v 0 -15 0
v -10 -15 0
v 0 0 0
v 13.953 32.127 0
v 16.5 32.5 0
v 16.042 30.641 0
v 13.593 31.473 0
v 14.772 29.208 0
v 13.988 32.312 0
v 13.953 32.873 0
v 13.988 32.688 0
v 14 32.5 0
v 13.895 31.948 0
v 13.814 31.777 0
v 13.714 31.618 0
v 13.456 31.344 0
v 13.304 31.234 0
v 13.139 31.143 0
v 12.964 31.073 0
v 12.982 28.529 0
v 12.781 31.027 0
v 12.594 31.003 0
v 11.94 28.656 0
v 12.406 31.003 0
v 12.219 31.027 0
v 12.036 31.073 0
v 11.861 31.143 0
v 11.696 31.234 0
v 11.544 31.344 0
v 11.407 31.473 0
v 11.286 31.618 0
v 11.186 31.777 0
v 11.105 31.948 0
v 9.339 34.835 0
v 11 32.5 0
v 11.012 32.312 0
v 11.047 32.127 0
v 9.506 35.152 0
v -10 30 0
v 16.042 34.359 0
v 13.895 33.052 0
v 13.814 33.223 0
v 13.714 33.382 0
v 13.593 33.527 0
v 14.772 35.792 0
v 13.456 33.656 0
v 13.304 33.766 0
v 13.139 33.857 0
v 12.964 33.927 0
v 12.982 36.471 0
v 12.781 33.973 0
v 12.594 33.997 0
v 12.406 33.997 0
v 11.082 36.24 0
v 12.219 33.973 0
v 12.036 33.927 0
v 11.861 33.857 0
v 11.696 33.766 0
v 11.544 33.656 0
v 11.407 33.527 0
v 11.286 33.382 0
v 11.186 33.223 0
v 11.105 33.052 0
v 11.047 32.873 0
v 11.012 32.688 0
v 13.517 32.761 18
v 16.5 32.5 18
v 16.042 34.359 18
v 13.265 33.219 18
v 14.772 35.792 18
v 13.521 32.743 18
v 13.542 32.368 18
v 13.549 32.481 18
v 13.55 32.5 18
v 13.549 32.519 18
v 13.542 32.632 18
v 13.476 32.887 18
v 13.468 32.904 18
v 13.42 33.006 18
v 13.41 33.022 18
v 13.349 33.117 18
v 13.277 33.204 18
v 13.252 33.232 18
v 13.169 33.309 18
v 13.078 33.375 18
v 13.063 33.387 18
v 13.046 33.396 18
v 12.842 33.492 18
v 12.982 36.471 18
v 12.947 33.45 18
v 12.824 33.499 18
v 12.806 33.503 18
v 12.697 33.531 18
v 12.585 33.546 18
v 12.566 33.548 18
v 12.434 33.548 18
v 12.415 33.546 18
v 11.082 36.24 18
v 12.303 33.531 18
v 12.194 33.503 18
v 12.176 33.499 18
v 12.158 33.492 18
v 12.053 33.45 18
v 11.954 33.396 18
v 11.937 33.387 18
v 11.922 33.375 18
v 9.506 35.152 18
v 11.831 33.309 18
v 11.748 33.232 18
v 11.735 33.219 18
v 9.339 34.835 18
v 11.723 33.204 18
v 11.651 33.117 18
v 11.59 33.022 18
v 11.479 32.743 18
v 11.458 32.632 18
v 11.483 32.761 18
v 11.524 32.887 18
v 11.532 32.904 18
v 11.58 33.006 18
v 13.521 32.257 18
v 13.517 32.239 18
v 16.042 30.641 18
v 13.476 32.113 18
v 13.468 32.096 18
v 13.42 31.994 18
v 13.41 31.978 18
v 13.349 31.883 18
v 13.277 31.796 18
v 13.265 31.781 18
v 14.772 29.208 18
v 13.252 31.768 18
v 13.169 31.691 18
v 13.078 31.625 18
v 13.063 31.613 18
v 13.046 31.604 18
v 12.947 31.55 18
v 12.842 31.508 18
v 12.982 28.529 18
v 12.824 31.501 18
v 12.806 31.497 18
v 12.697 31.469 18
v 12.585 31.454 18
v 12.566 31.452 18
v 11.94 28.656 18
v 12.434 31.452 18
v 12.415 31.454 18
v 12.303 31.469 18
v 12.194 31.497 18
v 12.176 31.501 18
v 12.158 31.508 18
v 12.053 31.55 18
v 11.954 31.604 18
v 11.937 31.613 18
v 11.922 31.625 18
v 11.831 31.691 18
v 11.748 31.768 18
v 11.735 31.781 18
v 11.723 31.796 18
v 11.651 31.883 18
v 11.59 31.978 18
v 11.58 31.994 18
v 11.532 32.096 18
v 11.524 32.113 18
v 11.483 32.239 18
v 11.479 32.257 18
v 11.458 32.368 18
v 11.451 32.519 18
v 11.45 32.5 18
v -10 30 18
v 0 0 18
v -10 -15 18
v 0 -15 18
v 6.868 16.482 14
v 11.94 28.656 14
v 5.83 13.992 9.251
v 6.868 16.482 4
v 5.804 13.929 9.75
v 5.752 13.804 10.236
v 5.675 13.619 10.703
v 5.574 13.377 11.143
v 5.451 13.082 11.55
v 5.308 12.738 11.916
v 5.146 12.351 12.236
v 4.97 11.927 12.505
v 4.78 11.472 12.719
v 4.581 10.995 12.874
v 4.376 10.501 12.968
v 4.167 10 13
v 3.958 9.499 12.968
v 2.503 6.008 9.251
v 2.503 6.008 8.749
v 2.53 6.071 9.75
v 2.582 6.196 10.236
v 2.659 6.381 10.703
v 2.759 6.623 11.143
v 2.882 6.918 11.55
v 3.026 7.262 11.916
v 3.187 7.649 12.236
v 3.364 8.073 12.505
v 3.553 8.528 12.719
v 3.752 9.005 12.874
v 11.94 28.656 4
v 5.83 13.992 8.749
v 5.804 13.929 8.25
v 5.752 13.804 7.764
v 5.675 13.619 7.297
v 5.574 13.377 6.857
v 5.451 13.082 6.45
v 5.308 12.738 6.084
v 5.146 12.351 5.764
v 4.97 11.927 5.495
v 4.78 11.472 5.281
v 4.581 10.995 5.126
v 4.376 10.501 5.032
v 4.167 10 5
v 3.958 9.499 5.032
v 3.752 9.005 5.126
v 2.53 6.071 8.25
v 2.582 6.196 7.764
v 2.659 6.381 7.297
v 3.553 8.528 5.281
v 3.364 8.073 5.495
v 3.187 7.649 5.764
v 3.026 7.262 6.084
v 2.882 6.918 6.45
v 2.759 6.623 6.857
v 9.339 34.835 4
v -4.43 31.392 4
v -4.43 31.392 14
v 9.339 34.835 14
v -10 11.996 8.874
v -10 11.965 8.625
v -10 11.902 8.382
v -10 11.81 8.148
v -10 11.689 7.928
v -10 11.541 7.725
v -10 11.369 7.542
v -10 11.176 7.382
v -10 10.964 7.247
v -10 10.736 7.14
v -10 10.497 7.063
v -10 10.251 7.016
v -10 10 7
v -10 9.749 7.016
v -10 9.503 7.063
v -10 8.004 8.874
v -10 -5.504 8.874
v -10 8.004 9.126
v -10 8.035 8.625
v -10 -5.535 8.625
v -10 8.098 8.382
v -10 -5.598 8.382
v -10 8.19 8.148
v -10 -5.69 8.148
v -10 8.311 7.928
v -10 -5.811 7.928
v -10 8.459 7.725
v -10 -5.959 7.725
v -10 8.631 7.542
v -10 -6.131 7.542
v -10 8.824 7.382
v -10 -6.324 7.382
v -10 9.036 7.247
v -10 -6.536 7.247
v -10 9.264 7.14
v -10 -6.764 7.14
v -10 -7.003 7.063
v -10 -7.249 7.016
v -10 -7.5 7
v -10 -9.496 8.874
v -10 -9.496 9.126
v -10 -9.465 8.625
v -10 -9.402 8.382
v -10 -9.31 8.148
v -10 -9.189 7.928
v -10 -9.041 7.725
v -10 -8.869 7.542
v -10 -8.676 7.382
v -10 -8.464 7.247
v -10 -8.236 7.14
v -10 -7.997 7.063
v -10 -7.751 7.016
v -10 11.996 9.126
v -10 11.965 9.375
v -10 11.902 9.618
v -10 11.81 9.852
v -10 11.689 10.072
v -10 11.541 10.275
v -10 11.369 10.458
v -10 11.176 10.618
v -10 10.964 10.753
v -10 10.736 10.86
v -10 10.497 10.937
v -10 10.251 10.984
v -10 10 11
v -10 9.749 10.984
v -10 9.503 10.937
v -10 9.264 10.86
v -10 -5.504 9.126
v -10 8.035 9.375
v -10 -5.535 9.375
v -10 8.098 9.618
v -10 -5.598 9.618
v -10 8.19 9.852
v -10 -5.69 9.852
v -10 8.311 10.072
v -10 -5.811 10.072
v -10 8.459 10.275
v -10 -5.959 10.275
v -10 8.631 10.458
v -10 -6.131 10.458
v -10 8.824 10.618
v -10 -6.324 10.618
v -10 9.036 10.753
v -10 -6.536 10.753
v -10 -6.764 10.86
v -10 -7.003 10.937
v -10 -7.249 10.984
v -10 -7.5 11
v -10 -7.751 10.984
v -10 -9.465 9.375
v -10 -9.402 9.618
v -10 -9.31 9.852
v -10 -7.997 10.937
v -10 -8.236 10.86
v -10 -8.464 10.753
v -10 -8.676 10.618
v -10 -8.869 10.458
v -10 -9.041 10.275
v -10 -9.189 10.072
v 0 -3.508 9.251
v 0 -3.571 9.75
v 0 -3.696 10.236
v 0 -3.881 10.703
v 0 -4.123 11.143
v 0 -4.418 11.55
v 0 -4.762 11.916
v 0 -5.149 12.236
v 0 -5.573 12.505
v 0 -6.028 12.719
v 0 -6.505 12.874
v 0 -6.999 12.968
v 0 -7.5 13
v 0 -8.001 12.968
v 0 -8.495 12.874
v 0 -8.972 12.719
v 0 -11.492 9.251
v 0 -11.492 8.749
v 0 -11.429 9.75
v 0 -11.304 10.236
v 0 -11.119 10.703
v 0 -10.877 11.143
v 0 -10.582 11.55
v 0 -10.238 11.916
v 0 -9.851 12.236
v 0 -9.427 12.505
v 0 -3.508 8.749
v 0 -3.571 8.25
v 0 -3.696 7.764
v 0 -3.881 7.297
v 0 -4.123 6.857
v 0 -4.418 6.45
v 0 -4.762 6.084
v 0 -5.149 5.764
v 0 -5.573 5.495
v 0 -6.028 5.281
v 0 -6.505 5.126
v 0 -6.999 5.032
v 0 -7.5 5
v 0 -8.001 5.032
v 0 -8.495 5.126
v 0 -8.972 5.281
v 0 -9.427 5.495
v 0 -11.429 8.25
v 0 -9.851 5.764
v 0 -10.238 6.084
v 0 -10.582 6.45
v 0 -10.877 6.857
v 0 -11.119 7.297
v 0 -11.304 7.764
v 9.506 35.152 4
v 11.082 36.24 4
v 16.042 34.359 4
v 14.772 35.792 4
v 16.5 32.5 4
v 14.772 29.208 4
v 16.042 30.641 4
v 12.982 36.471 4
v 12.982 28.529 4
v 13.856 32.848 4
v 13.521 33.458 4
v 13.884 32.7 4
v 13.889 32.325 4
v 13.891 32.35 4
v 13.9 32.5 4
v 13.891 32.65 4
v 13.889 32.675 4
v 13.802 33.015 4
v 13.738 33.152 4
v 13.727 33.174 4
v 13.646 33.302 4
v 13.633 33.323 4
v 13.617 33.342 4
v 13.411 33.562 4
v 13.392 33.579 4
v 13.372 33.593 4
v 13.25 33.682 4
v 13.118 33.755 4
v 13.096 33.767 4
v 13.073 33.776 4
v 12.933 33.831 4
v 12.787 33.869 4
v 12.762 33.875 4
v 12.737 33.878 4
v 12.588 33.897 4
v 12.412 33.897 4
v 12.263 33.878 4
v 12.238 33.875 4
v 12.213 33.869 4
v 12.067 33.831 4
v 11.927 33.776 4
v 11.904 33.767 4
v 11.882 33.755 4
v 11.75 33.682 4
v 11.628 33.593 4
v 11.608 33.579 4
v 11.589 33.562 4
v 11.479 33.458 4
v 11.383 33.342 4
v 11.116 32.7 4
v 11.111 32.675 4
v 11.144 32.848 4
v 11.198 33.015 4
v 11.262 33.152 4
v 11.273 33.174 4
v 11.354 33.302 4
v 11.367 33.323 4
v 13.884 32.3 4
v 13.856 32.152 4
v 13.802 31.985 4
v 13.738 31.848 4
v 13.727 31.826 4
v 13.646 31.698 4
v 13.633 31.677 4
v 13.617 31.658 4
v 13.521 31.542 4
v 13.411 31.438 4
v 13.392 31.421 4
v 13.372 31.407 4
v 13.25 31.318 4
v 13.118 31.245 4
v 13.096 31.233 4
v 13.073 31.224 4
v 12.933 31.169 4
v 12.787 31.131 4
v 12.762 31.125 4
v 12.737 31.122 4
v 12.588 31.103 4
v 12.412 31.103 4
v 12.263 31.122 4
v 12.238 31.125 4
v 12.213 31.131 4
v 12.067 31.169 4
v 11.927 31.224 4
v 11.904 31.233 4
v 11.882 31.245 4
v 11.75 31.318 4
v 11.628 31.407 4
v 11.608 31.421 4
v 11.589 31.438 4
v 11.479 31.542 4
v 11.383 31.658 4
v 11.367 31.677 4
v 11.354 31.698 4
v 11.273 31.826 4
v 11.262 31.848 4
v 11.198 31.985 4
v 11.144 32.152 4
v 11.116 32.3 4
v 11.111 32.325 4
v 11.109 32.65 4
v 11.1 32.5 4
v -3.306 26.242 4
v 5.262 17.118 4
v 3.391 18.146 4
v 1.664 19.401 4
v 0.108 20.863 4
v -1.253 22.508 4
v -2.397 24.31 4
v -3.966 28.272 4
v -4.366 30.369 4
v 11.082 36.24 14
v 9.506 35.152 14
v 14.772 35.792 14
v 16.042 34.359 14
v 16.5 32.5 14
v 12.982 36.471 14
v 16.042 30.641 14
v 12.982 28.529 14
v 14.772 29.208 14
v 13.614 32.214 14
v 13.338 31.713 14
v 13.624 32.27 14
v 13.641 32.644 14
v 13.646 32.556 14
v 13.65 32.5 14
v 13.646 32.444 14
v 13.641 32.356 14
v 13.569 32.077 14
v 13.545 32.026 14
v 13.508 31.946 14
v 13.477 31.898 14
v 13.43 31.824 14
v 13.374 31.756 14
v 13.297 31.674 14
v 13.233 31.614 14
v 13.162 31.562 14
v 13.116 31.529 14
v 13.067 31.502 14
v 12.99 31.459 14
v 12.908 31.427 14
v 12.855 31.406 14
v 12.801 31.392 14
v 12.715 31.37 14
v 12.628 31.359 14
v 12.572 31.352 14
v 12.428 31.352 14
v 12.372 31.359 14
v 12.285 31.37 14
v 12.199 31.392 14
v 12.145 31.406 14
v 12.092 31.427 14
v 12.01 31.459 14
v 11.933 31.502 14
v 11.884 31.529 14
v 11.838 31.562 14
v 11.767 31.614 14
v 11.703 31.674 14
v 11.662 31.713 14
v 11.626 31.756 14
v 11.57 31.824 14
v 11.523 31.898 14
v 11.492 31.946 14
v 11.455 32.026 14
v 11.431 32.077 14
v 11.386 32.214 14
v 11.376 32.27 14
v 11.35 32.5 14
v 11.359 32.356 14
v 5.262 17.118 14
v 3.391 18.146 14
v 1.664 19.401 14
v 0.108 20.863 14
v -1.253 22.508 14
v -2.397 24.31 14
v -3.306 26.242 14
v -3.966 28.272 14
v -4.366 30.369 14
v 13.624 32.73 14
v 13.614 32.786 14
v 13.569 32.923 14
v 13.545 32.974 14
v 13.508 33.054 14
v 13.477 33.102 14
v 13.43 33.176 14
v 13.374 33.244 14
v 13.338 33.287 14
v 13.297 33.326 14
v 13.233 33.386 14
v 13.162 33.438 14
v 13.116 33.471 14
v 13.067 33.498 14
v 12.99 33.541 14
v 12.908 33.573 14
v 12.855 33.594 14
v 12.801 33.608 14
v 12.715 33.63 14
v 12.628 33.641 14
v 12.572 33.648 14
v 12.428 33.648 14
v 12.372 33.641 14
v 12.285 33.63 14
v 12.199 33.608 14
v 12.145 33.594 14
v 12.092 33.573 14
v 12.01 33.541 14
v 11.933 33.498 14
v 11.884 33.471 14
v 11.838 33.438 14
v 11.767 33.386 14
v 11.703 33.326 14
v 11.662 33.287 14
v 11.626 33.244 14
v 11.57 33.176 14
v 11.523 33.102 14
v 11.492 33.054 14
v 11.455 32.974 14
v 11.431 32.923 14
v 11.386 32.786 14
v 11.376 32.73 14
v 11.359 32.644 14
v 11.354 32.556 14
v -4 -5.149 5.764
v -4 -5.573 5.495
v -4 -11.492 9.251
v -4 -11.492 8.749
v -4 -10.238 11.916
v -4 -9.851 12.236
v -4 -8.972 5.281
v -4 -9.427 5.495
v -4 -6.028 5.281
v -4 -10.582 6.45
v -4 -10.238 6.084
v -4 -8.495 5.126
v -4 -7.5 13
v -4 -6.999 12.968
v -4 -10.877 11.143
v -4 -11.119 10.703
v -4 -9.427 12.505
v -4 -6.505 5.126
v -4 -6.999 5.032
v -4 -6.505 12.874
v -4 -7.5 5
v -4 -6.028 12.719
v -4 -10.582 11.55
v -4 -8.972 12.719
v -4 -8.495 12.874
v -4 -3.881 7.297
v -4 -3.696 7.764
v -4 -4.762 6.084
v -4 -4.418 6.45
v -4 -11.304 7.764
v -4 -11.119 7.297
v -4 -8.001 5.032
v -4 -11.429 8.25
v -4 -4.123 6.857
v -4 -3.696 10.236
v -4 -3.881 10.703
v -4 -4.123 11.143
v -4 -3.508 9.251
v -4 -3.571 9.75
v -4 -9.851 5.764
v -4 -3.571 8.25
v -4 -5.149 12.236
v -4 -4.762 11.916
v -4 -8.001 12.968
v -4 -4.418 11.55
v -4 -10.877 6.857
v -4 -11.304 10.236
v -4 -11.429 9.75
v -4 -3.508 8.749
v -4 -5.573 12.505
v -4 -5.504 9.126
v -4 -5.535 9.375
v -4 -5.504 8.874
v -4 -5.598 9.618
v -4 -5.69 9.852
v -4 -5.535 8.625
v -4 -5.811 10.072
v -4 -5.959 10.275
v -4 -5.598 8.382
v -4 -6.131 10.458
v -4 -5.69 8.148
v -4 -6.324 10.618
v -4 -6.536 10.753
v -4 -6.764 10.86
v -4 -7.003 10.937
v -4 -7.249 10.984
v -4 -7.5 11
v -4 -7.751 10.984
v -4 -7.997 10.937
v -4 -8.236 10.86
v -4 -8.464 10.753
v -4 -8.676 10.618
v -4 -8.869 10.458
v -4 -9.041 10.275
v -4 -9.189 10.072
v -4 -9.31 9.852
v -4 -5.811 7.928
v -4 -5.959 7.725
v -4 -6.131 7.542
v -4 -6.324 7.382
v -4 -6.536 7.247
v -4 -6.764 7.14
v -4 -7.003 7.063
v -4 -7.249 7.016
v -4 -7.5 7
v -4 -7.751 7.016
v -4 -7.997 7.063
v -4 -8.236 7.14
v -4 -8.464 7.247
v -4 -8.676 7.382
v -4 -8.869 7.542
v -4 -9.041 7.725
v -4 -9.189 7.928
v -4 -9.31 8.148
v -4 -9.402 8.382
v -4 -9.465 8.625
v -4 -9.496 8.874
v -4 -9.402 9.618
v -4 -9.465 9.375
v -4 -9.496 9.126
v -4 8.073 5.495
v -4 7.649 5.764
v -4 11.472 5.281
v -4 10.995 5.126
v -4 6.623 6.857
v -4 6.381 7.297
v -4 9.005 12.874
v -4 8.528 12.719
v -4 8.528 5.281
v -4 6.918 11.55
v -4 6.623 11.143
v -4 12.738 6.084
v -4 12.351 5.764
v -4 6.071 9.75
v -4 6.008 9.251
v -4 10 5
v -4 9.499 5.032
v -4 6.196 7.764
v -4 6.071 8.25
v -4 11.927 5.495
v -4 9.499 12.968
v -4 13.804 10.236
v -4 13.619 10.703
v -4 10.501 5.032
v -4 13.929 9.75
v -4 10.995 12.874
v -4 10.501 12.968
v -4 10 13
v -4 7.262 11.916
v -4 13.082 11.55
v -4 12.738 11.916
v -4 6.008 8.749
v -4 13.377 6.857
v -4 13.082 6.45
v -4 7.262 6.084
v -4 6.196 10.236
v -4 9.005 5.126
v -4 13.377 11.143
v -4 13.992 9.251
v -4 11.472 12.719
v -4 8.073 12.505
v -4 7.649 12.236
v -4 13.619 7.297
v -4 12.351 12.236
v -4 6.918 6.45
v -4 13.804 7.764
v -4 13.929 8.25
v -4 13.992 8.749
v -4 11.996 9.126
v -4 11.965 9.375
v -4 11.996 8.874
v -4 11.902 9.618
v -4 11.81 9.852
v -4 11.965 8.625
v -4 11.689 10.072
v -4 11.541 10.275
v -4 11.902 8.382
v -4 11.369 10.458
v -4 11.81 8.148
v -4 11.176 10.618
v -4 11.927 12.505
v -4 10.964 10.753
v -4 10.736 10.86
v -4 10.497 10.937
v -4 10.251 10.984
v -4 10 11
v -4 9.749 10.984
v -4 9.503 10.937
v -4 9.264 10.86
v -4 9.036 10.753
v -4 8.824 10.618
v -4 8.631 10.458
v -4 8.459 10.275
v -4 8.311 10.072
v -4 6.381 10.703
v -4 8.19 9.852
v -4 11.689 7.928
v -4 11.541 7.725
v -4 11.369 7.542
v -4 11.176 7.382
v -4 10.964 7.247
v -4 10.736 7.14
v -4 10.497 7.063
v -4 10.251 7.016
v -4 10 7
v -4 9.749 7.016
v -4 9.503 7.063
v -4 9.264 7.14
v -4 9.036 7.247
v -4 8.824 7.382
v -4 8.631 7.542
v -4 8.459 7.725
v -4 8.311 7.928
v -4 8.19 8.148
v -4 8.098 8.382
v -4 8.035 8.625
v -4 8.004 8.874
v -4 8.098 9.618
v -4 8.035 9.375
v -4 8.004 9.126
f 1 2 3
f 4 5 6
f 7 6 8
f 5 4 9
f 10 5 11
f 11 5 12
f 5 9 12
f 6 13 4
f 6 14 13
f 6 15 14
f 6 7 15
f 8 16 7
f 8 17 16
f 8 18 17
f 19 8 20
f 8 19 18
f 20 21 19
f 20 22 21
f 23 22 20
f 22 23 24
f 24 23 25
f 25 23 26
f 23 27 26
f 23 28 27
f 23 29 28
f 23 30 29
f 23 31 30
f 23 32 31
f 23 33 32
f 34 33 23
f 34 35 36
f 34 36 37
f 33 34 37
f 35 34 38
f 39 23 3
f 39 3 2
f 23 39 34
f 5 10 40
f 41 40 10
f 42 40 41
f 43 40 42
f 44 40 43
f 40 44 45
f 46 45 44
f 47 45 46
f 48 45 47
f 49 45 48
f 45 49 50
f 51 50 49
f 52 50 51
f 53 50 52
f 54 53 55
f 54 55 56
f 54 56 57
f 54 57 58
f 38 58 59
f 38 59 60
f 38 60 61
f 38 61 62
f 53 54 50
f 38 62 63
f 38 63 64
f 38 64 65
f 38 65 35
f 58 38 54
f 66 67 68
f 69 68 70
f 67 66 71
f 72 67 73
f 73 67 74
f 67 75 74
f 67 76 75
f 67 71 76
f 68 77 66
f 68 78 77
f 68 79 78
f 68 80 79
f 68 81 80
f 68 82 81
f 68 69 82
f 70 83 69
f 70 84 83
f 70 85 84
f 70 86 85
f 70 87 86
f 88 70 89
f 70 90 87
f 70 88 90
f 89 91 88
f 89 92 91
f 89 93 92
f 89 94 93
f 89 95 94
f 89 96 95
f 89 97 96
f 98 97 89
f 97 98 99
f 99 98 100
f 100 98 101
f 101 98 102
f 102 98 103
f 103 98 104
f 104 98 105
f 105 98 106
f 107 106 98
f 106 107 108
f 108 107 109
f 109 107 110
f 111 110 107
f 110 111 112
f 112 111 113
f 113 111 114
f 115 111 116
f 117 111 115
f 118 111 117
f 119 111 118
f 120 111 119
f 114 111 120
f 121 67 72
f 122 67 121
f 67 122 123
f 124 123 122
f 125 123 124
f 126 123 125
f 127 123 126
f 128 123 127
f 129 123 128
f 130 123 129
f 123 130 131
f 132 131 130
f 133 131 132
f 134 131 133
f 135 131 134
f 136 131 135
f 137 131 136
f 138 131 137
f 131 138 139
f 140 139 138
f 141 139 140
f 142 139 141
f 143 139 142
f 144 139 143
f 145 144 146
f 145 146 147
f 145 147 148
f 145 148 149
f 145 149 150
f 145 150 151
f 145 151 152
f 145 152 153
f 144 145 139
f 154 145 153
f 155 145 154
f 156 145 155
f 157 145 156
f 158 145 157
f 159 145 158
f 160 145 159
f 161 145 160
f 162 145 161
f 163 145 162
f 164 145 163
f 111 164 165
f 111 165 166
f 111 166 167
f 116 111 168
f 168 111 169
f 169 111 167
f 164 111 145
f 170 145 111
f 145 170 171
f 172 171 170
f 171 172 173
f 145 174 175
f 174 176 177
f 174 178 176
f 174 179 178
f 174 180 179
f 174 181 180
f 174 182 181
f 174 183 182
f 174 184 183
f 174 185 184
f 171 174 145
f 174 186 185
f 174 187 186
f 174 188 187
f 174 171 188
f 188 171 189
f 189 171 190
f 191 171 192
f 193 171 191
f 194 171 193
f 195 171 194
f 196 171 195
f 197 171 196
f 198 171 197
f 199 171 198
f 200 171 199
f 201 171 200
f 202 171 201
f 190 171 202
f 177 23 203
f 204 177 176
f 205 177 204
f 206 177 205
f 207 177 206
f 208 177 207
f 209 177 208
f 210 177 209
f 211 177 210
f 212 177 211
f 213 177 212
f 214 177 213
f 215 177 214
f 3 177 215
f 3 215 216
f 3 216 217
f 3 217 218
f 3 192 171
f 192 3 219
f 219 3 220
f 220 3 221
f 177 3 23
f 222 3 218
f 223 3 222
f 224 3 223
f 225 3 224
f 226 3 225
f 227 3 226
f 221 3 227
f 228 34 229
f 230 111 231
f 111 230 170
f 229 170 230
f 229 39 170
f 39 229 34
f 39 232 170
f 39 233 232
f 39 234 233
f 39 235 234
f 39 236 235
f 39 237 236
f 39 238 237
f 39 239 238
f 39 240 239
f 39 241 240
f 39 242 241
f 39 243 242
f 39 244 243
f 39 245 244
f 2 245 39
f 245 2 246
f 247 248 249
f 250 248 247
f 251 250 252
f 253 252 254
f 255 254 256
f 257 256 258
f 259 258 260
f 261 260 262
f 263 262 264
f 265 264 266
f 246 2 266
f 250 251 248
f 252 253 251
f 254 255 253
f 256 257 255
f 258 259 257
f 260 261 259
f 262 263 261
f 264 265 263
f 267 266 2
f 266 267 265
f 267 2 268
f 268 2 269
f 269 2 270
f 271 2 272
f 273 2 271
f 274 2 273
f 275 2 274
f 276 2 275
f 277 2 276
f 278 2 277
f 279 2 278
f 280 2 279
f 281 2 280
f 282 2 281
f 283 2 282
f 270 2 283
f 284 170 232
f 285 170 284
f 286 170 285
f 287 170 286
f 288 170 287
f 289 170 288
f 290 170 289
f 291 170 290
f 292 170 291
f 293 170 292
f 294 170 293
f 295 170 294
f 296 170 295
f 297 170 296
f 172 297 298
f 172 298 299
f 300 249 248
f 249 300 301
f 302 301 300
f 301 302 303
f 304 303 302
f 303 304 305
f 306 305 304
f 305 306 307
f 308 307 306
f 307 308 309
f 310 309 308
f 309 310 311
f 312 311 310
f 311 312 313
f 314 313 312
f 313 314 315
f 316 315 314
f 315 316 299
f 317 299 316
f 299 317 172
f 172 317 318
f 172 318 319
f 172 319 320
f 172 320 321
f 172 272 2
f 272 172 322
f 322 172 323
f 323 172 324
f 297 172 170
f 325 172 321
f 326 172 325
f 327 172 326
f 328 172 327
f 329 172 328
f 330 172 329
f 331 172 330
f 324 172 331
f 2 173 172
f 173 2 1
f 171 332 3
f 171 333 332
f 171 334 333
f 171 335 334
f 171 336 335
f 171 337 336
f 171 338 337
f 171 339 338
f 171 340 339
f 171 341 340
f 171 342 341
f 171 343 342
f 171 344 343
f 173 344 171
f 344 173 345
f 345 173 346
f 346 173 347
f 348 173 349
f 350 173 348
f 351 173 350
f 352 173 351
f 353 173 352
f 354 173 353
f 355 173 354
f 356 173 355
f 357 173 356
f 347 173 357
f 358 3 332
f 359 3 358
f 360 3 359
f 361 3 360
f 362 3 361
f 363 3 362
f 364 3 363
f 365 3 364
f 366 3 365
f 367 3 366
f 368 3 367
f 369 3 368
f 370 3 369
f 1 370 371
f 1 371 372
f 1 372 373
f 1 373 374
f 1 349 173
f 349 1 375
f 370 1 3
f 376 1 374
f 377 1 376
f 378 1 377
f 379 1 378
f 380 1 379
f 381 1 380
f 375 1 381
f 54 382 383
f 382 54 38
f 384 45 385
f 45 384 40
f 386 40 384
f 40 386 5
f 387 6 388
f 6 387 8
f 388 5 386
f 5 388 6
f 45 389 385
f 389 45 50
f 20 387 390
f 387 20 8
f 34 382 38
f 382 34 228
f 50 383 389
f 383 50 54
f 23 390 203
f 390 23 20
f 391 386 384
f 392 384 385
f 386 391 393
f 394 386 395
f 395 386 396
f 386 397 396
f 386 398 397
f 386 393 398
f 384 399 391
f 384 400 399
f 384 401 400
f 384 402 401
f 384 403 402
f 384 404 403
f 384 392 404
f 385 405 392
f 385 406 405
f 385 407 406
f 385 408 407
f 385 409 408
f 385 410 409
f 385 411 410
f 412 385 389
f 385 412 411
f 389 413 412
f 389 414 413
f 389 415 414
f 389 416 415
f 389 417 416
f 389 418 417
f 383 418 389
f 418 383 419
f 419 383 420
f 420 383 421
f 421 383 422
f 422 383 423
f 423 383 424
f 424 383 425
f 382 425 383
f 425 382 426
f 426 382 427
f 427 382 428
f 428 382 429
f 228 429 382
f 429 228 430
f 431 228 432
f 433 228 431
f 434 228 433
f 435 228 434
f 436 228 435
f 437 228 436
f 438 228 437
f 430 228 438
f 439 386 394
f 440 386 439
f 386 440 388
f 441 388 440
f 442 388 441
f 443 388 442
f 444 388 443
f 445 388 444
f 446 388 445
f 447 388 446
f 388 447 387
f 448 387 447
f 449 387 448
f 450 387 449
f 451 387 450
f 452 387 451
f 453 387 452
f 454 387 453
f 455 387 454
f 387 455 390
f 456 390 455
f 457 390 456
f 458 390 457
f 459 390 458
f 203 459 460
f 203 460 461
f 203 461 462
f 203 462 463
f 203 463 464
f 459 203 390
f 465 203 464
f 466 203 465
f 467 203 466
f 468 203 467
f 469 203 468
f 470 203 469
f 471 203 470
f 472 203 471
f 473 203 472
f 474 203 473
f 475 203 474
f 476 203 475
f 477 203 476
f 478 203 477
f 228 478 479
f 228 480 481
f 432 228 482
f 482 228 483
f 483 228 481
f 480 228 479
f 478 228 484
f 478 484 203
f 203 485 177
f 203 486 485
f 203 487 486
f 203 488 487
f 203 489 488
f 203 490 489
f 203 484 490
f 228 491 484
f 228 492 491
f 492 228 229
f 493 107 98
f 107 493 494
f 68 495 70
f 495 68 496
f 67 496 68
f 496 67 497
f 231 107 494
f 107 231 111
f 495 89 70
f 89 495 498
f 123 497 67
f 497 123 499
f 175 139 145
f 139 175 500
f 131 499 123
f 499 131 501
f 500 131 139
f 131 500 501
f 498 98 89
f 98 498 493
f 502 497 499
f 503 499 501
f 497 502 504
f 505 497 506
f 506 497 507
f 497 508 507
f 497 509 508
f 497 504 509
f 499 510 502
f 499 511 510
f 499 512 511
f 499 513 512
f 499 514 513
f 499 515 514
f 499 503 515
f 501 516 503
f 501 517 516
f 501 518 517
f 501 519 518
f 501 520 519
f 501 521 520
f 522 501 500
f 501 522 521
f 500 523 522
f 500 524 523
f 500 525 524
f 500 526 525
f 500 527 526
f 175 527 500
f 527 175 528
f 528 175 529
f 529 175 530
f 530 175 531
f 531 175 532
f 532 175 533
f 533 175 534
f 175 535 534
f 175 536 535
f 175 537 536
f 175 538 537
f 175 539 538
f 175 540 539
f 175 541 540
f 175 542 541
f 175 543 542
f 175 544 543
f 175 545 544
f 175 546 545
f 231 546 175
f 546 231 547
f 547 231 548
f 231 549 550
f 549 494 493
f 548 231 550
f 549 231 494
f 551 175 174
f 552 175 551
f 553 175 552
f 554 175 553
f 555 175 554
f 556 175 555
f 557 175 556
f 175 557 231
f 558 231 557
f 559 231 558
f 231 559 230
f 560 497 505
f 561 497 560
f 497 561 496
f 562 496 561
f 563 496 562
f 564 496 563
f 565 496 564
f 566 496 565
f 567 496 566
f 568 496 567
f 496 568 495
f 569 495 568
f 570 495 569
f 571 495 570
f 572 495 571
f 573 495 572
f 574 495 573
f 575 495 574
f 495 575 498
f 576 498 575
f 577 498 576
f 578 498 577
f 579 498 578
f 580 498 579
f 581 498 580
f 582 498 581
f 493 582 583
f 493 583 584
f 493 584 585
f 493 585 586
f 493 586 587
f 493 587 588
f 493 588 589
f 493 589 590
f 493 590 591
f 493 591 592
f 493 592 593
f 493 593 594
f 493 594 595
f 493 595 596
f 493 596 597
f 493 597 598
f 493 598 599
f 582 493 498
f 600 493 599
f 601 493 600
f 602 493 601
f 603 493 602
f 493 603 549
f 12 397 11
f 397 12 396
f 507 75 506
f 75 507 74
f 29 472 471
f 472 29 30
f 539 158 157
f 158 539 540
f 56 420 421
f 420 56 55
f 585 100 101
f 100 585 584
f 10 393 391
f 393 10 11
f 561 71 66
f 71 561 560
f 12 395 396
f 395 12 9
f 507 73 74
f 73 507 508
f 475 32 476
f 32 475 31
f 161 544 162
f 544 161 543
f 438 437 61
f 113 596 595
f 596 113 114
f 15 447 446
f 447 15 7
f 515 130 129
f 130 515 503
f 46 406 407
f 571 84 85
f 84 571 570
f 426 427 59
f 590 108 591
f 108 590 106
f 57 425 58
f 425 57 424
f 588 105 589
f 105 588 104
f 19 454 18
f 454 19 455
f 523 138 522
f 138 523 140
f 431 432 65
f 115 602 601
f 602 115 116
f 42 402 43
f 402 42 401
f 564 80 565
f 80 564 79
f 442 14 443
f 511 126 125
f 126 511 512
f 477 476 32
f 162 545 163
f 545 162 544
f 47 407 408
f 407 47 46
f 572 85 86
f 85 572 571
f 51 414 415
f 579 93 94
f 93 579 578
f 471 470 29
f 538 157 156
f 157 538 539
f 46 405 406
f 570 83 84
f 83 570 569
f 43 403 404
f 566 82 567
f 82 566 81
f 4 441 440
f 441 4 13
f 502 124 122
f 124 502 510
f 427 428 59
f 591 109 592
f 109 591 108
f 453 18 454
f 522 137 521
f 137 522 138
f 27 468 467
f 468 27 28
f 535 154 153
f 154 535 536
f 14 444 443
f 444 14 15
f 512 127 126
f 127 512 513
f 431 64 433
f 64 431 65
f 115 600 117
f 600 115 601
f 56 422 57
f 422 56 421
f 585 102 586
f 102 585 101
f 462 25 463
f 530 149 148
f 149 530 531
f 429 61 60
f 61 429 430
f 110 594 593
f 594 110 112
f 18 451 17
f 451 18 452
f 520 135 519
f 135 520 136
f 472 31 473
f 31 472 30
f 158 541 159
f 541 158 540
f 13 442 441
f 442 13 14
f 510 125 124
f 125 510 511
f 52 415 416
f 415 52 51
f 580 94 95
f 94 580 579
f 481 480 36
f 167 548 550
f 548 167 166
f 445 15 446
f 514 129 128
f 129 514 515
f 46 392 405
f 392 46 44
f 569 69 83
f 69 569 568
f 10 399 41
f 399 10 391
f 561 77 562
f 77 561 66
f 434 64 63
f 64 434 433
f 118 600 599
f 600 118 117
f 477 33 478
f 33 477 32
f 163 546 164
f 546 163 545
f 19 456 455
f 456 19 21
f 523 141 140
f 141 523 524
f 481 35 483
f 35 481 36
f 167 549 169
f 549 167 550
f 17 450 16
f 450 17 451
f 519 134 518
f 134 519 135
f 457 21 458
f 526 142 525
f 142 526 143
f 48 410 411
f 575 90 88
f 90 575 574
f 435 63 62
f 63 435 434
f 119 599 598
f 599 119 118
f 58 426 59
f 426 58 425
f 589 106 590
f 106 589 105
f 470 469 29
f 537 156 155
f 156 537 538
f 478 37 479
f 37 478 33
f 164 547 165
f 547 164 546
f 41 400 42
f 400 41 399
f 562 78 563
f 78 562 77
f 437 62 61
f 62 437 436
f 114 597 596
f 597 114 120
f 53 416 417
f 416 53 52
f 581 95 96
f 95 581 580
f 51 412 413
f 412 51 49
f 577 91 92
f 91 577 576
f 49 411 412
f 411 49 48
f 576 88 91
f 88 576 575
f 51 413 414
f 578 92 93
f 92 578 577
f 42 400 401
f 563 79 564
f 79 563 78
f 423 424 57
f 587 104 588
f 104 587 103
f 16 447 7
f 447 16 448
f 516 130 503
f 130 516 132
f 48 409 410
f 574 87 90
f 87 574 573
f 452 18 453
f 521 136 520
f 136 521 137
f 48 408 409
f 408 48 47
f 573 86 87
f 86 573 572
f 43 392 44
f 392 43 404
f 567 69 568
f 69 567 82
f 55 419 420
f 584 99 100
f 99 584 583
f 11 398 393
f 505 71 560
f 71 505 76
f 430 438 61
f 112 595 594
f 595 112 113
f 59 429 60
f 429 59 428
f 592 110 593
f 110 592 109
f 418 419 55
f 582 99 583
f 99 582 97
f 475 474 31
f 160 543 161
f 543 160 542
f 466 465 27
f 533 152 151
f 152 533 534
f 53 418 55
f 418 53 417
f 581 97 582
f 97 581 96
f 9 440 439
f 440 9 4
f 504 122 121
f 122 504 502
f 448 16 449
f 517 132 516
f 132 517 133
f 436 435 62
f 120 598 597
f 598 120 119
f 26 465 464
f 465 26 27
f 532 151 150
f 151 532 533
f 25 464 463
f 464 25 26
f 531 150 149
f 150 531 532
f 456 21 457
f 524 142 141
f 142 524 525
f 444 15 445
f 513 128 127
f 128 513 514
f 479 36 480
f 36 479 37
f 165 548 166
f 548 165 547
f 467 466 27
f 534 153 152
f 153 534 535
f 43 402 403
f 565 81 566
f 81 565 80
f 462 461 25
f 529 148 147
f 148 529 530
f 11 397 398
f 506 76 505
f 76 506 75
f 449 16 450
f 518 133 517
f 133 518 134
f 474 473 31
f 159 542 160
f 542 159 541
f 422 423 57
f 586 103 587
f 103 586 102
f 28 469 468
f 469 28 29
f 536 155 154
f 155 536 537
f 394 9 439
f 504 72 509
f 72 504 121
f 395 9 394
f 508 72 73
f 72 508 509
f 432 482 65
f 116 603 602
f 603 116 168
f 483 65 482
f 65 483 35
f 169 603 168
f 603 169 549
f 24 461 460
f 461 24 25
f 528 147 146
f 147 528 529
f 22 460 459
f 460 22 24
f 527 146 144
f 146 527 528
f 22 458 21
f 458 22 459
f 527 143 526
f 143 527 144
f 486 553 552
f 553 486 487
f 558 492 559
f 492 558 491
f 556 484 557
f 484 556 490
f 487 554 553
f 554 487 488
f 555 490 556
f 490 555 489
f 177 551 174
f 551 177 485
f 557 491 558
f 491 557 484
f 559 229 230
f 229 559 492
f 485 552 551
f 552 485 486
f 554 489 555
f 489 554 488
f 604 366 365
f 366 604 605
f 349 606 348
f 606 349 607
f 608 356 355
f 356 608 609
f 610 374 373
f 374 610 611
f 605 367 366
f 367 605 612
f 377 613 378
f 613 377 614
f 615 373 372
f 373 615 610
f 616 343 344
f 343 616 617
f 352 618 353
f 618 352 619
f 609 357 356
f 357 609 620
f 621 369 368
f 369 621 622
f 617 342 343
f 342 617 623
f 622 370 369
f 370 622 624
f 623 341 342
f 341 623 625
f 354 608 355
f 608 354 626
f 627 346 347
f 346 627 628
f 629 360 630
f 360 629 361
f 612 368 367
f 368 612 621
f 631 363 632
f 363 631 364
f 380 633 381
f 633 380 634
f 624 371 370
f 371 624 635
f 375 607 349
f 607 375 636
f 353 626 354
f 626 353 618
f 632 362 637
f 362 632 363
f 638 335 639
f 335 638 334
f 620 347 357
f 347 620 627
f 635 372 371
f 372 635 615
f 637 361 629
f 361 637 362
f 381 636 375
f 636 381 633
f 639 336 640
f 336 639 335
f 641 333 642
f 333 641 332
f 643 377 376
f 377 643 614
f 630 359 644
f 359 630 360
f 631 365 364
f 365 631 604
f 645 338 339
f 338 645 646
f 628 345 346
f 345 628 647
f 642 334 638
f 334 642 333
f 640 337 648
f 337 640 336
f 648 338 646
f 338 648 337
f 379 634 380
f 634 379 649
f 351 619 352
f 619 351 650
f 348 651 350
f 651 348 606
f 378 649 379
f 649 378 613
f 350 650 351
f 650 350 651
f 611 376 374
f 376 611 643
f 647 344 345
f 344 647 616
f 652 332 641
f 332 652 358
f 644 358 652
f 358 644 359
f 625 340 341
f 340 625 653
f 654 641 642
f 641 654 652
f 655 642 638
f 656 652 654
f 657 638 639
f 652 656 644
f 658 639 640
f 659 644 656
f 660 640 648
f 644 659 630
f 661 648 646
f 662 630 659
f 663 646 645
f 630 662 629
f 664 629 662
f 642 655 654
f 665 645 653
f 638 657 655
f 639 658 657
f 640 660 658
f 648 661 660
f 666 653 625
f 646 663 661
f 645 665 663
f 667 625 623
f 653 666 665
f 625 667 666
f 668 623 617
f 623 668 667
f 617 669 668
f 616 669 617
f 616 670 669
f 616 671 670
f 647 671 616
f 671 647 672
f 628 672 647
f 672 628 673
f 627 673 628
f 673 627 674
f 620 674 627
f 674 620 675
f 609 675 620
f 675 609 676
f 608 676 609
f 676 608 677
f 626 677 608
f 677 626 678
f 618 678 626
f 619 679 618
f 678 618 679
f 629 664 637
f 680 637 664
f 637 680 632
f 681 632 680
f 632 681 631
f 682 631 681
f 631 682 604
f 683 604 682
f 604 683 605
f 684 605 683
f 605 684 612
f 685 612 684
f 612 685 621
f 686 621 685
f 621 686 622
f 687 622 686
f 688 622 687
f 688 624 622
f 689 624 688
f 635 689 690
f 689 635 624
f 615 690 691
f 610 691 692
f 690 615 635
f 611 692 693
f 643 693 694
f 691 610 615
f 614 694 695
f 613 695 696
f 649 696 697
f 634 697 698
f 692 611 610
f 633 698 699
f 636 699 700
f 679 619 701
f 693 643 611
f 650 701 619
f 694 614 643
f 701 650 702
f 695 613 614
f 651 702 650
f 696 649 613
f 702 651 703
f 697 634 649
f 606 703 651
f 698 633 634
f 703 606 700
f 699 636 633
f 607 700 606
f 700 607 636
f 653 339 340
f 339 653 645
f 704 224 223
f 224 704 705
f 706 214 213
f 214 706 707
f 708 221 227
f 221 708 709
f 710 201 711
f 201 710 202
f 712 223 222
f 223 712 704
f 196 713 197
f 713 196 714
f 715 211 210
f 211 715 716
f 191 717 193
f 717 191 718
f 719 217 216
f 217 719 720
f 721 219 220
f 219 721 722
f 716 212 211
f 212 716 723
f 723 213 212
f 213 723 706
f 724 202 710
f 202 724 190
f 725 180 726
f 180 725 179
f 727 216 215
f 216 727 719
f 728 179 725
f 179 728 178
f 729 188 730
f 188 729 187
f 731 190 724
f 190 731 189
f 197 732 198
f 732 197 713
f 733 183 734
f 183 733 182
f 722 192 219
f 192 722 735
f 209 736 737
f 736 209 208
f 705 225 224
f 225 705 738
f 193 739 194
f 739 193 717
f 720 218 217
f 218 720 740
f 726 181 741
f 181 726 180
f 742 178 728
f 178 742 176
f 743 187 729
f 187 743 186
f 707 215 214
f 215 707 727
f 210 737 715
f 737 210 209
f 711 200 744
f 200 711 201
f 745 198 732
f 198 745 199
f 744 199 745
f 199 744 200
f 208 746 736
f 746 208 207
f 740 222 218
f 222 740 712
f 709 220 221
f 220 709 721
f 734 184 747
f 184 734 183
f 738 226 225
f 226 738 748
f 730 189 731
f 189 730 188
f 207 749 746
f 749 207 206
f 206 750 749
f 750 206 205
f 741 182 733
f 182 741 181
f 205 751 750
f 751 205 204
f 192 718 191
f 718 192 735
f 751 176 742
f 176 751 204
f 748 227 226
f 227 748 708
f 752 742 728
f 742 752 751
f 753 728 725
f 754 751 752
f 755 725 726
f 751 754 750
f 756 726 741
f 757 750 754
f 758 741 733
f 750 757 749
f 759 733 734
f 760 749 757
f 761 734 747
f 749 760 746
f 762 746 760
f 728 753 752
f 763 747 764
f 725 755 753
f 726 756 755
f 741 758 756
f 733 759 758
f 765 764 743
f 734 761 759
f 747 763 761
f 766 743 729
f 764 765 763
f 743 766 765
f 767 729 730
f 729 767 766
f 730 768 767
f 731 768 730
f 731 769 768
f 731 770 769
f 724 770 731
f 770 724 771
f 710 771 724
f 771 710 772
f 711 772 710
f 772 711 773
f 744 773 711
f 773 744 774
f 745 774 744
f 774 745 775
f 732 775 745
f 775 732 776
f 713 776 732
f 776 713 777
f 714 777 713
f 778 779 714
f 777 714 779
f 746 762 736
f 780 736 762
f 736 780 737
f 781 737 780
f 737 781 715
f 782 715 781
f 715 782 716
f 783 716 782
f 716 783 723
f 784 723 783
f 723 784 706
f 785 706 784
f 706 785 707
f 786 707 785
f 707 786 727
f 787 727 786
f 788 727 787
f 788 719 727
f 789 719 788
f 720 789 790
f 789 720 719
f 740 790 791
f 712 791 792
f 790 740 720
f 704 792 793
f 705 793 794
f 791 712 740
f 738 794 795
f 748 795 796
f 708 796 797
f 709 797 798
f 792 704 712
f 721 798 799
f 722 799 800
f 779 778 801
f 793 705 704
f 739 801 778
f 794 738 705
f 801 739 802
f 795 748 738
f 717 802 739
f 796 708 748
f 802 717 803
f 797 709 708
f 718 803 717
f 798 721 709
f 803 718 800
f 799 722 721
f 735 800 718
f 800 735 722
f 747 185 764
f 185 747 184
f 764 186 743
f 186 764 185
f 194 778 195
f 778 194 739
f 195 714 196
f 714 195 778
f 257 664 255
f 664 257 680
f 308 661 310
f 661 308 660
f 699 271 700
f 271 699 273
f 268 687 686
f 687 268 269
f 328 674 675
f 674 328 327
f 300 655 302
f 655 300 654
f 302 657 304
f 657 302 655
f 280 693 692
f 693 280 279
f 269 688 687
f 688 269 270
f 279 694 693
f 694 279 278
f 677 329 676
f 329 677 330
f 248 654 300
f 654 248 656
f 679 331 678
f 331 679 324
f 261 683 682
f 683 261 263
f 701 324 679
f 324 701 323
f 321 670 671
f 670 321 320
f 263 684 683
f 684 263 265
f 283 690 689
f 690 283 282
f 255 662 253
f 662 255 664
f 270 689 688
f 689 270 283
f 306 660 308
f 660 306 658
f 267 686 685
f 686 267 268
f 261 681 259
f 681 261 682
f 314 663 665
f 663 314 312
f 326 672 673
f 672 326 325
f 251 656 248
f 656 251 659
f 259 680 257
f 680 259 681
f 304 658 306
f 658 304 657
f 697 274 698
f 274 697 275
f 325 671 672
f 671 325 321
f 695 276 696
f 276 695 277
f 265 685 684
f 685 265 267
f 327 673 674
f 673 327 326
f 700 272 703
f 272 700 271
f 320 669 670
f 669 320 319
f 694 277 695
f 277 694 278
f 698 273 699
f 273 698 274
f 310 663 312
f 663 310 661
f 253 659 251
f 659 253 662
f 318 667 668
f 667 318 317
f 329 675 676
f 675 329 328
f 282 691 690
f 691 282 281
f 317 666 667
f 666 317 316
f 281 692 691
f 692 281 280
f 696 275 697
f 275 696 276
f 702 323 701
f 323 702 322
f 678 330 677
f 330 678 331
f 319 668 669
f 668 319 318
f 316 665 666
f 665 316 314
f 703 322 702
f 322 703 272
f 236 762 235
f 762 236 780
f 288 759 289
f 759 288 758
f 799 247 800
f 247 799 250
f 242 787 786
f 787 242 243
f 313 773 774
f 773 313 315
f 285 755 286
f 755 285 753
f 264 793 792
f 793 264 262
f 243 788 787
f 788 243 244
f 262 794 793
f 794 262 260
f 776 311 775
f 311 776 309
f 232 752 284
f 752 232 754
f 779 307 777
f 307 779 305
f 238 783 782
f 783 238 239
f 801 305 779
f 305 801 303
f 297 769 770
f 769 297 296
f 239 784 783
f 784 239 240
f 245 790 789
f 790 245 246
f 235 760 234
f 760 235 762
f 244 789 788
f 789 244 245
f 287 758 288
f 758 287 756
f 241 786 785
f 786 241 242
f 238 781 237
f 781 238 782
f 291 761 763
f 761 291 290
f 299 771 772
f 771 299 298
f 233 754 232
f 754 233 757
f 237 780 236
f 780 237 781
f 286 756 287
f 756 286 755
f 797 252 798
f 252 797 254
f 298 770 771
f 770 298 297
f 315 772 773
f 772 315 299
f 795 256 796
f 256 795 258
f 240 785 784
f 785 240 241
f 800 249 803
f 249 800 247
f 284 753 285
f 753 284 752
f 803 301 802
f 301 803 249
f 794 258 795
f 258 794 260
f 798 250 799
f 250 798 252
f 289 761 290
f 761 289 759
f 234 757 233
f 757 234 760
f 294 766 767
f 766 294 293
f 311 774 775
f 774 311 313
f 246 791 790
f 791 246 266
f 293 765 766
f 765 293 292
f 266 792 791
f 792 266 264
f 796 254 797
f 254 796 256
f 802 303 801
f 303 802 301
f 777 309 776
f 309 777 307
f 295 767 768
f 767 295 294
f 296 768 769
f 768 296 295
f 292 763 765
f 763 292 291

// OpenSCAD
// -------- Este módulo fue creado por Fernando Castro 	--------
// -------- on the 10/08/2016 y está disponible  para ser distribuido sin restricciones.

// Soporte de polea para riel de aire FCEN

//Dimensiones de la tapa + porta polea
tubo=50;
espesor_t=2;
ancho_t=10;
d_polea=30;
d_ruleman=3;

difference(){
union(){
    linear_extrude(height =ancho_t+4*espesor_t,  convexity = 10){
polygon([[-10,-15],[-10,0],[-10,30],[10,35],[15,35],[15,30],[12.5,30],[0,0],[0,-15]]);}
translate([12.5,32.5,0])
cylinder(4,d_ruleman+1,d_ruleman+1);
translate([12.5,32.5,14])
cylinder(4,d_ruleman+1,d_ruleman+1);
}
color("red")
translate([10,30,4])
cube(size=[5,5,8]);
translate([12.5,32.5,0])
cylinder(2*ancho_t,d_ruleman/2,$fn=50);
color("red")
translate([12.5,32.5,2*espesor_t])
cylinder(ancho_t,d_polea/2+espesor_t,d_polea/2+espesor_t,$fn=50);
rotate([0,90,0])
translate([-9,-7.5,-4])
cylinder(4,4,4,$fn=50);
rotate([0,90,0])
translate([-9,10,-4])
cylinder(10,4,4,$fn=50);
rotate([0,90,0])
translate([-9,-7.5,-11])
cylinder(15,2,2,$fn=50);
rotate([0,90,0])
translate([-9,10,-11])
cylinder(20,2,2,$fn=50);
}

//color("red")
//translate([12.5,32.5,espesor_t+espesor_t/2])
//cylinder(ancho_t-espesor_t,d_polea/2,d_polea/2,$fn=50);
//color("red")
//translate([10,30,3])
//cube(size=[5,5,8]);
//color("red")
//translate([12.5,32.5,0])
//cylinder(4,d_ruleman,d_ruleman);
//color("red")
//rotate([0,90,0])
//translate([-9,-7.5,-11])
//cylinder(15,2,2,$fn=50);
////
//color("red")
//rotate([0,90,0])
//translate([-9,10,-11])
//cylinder(20,2,2,$fn=50);
